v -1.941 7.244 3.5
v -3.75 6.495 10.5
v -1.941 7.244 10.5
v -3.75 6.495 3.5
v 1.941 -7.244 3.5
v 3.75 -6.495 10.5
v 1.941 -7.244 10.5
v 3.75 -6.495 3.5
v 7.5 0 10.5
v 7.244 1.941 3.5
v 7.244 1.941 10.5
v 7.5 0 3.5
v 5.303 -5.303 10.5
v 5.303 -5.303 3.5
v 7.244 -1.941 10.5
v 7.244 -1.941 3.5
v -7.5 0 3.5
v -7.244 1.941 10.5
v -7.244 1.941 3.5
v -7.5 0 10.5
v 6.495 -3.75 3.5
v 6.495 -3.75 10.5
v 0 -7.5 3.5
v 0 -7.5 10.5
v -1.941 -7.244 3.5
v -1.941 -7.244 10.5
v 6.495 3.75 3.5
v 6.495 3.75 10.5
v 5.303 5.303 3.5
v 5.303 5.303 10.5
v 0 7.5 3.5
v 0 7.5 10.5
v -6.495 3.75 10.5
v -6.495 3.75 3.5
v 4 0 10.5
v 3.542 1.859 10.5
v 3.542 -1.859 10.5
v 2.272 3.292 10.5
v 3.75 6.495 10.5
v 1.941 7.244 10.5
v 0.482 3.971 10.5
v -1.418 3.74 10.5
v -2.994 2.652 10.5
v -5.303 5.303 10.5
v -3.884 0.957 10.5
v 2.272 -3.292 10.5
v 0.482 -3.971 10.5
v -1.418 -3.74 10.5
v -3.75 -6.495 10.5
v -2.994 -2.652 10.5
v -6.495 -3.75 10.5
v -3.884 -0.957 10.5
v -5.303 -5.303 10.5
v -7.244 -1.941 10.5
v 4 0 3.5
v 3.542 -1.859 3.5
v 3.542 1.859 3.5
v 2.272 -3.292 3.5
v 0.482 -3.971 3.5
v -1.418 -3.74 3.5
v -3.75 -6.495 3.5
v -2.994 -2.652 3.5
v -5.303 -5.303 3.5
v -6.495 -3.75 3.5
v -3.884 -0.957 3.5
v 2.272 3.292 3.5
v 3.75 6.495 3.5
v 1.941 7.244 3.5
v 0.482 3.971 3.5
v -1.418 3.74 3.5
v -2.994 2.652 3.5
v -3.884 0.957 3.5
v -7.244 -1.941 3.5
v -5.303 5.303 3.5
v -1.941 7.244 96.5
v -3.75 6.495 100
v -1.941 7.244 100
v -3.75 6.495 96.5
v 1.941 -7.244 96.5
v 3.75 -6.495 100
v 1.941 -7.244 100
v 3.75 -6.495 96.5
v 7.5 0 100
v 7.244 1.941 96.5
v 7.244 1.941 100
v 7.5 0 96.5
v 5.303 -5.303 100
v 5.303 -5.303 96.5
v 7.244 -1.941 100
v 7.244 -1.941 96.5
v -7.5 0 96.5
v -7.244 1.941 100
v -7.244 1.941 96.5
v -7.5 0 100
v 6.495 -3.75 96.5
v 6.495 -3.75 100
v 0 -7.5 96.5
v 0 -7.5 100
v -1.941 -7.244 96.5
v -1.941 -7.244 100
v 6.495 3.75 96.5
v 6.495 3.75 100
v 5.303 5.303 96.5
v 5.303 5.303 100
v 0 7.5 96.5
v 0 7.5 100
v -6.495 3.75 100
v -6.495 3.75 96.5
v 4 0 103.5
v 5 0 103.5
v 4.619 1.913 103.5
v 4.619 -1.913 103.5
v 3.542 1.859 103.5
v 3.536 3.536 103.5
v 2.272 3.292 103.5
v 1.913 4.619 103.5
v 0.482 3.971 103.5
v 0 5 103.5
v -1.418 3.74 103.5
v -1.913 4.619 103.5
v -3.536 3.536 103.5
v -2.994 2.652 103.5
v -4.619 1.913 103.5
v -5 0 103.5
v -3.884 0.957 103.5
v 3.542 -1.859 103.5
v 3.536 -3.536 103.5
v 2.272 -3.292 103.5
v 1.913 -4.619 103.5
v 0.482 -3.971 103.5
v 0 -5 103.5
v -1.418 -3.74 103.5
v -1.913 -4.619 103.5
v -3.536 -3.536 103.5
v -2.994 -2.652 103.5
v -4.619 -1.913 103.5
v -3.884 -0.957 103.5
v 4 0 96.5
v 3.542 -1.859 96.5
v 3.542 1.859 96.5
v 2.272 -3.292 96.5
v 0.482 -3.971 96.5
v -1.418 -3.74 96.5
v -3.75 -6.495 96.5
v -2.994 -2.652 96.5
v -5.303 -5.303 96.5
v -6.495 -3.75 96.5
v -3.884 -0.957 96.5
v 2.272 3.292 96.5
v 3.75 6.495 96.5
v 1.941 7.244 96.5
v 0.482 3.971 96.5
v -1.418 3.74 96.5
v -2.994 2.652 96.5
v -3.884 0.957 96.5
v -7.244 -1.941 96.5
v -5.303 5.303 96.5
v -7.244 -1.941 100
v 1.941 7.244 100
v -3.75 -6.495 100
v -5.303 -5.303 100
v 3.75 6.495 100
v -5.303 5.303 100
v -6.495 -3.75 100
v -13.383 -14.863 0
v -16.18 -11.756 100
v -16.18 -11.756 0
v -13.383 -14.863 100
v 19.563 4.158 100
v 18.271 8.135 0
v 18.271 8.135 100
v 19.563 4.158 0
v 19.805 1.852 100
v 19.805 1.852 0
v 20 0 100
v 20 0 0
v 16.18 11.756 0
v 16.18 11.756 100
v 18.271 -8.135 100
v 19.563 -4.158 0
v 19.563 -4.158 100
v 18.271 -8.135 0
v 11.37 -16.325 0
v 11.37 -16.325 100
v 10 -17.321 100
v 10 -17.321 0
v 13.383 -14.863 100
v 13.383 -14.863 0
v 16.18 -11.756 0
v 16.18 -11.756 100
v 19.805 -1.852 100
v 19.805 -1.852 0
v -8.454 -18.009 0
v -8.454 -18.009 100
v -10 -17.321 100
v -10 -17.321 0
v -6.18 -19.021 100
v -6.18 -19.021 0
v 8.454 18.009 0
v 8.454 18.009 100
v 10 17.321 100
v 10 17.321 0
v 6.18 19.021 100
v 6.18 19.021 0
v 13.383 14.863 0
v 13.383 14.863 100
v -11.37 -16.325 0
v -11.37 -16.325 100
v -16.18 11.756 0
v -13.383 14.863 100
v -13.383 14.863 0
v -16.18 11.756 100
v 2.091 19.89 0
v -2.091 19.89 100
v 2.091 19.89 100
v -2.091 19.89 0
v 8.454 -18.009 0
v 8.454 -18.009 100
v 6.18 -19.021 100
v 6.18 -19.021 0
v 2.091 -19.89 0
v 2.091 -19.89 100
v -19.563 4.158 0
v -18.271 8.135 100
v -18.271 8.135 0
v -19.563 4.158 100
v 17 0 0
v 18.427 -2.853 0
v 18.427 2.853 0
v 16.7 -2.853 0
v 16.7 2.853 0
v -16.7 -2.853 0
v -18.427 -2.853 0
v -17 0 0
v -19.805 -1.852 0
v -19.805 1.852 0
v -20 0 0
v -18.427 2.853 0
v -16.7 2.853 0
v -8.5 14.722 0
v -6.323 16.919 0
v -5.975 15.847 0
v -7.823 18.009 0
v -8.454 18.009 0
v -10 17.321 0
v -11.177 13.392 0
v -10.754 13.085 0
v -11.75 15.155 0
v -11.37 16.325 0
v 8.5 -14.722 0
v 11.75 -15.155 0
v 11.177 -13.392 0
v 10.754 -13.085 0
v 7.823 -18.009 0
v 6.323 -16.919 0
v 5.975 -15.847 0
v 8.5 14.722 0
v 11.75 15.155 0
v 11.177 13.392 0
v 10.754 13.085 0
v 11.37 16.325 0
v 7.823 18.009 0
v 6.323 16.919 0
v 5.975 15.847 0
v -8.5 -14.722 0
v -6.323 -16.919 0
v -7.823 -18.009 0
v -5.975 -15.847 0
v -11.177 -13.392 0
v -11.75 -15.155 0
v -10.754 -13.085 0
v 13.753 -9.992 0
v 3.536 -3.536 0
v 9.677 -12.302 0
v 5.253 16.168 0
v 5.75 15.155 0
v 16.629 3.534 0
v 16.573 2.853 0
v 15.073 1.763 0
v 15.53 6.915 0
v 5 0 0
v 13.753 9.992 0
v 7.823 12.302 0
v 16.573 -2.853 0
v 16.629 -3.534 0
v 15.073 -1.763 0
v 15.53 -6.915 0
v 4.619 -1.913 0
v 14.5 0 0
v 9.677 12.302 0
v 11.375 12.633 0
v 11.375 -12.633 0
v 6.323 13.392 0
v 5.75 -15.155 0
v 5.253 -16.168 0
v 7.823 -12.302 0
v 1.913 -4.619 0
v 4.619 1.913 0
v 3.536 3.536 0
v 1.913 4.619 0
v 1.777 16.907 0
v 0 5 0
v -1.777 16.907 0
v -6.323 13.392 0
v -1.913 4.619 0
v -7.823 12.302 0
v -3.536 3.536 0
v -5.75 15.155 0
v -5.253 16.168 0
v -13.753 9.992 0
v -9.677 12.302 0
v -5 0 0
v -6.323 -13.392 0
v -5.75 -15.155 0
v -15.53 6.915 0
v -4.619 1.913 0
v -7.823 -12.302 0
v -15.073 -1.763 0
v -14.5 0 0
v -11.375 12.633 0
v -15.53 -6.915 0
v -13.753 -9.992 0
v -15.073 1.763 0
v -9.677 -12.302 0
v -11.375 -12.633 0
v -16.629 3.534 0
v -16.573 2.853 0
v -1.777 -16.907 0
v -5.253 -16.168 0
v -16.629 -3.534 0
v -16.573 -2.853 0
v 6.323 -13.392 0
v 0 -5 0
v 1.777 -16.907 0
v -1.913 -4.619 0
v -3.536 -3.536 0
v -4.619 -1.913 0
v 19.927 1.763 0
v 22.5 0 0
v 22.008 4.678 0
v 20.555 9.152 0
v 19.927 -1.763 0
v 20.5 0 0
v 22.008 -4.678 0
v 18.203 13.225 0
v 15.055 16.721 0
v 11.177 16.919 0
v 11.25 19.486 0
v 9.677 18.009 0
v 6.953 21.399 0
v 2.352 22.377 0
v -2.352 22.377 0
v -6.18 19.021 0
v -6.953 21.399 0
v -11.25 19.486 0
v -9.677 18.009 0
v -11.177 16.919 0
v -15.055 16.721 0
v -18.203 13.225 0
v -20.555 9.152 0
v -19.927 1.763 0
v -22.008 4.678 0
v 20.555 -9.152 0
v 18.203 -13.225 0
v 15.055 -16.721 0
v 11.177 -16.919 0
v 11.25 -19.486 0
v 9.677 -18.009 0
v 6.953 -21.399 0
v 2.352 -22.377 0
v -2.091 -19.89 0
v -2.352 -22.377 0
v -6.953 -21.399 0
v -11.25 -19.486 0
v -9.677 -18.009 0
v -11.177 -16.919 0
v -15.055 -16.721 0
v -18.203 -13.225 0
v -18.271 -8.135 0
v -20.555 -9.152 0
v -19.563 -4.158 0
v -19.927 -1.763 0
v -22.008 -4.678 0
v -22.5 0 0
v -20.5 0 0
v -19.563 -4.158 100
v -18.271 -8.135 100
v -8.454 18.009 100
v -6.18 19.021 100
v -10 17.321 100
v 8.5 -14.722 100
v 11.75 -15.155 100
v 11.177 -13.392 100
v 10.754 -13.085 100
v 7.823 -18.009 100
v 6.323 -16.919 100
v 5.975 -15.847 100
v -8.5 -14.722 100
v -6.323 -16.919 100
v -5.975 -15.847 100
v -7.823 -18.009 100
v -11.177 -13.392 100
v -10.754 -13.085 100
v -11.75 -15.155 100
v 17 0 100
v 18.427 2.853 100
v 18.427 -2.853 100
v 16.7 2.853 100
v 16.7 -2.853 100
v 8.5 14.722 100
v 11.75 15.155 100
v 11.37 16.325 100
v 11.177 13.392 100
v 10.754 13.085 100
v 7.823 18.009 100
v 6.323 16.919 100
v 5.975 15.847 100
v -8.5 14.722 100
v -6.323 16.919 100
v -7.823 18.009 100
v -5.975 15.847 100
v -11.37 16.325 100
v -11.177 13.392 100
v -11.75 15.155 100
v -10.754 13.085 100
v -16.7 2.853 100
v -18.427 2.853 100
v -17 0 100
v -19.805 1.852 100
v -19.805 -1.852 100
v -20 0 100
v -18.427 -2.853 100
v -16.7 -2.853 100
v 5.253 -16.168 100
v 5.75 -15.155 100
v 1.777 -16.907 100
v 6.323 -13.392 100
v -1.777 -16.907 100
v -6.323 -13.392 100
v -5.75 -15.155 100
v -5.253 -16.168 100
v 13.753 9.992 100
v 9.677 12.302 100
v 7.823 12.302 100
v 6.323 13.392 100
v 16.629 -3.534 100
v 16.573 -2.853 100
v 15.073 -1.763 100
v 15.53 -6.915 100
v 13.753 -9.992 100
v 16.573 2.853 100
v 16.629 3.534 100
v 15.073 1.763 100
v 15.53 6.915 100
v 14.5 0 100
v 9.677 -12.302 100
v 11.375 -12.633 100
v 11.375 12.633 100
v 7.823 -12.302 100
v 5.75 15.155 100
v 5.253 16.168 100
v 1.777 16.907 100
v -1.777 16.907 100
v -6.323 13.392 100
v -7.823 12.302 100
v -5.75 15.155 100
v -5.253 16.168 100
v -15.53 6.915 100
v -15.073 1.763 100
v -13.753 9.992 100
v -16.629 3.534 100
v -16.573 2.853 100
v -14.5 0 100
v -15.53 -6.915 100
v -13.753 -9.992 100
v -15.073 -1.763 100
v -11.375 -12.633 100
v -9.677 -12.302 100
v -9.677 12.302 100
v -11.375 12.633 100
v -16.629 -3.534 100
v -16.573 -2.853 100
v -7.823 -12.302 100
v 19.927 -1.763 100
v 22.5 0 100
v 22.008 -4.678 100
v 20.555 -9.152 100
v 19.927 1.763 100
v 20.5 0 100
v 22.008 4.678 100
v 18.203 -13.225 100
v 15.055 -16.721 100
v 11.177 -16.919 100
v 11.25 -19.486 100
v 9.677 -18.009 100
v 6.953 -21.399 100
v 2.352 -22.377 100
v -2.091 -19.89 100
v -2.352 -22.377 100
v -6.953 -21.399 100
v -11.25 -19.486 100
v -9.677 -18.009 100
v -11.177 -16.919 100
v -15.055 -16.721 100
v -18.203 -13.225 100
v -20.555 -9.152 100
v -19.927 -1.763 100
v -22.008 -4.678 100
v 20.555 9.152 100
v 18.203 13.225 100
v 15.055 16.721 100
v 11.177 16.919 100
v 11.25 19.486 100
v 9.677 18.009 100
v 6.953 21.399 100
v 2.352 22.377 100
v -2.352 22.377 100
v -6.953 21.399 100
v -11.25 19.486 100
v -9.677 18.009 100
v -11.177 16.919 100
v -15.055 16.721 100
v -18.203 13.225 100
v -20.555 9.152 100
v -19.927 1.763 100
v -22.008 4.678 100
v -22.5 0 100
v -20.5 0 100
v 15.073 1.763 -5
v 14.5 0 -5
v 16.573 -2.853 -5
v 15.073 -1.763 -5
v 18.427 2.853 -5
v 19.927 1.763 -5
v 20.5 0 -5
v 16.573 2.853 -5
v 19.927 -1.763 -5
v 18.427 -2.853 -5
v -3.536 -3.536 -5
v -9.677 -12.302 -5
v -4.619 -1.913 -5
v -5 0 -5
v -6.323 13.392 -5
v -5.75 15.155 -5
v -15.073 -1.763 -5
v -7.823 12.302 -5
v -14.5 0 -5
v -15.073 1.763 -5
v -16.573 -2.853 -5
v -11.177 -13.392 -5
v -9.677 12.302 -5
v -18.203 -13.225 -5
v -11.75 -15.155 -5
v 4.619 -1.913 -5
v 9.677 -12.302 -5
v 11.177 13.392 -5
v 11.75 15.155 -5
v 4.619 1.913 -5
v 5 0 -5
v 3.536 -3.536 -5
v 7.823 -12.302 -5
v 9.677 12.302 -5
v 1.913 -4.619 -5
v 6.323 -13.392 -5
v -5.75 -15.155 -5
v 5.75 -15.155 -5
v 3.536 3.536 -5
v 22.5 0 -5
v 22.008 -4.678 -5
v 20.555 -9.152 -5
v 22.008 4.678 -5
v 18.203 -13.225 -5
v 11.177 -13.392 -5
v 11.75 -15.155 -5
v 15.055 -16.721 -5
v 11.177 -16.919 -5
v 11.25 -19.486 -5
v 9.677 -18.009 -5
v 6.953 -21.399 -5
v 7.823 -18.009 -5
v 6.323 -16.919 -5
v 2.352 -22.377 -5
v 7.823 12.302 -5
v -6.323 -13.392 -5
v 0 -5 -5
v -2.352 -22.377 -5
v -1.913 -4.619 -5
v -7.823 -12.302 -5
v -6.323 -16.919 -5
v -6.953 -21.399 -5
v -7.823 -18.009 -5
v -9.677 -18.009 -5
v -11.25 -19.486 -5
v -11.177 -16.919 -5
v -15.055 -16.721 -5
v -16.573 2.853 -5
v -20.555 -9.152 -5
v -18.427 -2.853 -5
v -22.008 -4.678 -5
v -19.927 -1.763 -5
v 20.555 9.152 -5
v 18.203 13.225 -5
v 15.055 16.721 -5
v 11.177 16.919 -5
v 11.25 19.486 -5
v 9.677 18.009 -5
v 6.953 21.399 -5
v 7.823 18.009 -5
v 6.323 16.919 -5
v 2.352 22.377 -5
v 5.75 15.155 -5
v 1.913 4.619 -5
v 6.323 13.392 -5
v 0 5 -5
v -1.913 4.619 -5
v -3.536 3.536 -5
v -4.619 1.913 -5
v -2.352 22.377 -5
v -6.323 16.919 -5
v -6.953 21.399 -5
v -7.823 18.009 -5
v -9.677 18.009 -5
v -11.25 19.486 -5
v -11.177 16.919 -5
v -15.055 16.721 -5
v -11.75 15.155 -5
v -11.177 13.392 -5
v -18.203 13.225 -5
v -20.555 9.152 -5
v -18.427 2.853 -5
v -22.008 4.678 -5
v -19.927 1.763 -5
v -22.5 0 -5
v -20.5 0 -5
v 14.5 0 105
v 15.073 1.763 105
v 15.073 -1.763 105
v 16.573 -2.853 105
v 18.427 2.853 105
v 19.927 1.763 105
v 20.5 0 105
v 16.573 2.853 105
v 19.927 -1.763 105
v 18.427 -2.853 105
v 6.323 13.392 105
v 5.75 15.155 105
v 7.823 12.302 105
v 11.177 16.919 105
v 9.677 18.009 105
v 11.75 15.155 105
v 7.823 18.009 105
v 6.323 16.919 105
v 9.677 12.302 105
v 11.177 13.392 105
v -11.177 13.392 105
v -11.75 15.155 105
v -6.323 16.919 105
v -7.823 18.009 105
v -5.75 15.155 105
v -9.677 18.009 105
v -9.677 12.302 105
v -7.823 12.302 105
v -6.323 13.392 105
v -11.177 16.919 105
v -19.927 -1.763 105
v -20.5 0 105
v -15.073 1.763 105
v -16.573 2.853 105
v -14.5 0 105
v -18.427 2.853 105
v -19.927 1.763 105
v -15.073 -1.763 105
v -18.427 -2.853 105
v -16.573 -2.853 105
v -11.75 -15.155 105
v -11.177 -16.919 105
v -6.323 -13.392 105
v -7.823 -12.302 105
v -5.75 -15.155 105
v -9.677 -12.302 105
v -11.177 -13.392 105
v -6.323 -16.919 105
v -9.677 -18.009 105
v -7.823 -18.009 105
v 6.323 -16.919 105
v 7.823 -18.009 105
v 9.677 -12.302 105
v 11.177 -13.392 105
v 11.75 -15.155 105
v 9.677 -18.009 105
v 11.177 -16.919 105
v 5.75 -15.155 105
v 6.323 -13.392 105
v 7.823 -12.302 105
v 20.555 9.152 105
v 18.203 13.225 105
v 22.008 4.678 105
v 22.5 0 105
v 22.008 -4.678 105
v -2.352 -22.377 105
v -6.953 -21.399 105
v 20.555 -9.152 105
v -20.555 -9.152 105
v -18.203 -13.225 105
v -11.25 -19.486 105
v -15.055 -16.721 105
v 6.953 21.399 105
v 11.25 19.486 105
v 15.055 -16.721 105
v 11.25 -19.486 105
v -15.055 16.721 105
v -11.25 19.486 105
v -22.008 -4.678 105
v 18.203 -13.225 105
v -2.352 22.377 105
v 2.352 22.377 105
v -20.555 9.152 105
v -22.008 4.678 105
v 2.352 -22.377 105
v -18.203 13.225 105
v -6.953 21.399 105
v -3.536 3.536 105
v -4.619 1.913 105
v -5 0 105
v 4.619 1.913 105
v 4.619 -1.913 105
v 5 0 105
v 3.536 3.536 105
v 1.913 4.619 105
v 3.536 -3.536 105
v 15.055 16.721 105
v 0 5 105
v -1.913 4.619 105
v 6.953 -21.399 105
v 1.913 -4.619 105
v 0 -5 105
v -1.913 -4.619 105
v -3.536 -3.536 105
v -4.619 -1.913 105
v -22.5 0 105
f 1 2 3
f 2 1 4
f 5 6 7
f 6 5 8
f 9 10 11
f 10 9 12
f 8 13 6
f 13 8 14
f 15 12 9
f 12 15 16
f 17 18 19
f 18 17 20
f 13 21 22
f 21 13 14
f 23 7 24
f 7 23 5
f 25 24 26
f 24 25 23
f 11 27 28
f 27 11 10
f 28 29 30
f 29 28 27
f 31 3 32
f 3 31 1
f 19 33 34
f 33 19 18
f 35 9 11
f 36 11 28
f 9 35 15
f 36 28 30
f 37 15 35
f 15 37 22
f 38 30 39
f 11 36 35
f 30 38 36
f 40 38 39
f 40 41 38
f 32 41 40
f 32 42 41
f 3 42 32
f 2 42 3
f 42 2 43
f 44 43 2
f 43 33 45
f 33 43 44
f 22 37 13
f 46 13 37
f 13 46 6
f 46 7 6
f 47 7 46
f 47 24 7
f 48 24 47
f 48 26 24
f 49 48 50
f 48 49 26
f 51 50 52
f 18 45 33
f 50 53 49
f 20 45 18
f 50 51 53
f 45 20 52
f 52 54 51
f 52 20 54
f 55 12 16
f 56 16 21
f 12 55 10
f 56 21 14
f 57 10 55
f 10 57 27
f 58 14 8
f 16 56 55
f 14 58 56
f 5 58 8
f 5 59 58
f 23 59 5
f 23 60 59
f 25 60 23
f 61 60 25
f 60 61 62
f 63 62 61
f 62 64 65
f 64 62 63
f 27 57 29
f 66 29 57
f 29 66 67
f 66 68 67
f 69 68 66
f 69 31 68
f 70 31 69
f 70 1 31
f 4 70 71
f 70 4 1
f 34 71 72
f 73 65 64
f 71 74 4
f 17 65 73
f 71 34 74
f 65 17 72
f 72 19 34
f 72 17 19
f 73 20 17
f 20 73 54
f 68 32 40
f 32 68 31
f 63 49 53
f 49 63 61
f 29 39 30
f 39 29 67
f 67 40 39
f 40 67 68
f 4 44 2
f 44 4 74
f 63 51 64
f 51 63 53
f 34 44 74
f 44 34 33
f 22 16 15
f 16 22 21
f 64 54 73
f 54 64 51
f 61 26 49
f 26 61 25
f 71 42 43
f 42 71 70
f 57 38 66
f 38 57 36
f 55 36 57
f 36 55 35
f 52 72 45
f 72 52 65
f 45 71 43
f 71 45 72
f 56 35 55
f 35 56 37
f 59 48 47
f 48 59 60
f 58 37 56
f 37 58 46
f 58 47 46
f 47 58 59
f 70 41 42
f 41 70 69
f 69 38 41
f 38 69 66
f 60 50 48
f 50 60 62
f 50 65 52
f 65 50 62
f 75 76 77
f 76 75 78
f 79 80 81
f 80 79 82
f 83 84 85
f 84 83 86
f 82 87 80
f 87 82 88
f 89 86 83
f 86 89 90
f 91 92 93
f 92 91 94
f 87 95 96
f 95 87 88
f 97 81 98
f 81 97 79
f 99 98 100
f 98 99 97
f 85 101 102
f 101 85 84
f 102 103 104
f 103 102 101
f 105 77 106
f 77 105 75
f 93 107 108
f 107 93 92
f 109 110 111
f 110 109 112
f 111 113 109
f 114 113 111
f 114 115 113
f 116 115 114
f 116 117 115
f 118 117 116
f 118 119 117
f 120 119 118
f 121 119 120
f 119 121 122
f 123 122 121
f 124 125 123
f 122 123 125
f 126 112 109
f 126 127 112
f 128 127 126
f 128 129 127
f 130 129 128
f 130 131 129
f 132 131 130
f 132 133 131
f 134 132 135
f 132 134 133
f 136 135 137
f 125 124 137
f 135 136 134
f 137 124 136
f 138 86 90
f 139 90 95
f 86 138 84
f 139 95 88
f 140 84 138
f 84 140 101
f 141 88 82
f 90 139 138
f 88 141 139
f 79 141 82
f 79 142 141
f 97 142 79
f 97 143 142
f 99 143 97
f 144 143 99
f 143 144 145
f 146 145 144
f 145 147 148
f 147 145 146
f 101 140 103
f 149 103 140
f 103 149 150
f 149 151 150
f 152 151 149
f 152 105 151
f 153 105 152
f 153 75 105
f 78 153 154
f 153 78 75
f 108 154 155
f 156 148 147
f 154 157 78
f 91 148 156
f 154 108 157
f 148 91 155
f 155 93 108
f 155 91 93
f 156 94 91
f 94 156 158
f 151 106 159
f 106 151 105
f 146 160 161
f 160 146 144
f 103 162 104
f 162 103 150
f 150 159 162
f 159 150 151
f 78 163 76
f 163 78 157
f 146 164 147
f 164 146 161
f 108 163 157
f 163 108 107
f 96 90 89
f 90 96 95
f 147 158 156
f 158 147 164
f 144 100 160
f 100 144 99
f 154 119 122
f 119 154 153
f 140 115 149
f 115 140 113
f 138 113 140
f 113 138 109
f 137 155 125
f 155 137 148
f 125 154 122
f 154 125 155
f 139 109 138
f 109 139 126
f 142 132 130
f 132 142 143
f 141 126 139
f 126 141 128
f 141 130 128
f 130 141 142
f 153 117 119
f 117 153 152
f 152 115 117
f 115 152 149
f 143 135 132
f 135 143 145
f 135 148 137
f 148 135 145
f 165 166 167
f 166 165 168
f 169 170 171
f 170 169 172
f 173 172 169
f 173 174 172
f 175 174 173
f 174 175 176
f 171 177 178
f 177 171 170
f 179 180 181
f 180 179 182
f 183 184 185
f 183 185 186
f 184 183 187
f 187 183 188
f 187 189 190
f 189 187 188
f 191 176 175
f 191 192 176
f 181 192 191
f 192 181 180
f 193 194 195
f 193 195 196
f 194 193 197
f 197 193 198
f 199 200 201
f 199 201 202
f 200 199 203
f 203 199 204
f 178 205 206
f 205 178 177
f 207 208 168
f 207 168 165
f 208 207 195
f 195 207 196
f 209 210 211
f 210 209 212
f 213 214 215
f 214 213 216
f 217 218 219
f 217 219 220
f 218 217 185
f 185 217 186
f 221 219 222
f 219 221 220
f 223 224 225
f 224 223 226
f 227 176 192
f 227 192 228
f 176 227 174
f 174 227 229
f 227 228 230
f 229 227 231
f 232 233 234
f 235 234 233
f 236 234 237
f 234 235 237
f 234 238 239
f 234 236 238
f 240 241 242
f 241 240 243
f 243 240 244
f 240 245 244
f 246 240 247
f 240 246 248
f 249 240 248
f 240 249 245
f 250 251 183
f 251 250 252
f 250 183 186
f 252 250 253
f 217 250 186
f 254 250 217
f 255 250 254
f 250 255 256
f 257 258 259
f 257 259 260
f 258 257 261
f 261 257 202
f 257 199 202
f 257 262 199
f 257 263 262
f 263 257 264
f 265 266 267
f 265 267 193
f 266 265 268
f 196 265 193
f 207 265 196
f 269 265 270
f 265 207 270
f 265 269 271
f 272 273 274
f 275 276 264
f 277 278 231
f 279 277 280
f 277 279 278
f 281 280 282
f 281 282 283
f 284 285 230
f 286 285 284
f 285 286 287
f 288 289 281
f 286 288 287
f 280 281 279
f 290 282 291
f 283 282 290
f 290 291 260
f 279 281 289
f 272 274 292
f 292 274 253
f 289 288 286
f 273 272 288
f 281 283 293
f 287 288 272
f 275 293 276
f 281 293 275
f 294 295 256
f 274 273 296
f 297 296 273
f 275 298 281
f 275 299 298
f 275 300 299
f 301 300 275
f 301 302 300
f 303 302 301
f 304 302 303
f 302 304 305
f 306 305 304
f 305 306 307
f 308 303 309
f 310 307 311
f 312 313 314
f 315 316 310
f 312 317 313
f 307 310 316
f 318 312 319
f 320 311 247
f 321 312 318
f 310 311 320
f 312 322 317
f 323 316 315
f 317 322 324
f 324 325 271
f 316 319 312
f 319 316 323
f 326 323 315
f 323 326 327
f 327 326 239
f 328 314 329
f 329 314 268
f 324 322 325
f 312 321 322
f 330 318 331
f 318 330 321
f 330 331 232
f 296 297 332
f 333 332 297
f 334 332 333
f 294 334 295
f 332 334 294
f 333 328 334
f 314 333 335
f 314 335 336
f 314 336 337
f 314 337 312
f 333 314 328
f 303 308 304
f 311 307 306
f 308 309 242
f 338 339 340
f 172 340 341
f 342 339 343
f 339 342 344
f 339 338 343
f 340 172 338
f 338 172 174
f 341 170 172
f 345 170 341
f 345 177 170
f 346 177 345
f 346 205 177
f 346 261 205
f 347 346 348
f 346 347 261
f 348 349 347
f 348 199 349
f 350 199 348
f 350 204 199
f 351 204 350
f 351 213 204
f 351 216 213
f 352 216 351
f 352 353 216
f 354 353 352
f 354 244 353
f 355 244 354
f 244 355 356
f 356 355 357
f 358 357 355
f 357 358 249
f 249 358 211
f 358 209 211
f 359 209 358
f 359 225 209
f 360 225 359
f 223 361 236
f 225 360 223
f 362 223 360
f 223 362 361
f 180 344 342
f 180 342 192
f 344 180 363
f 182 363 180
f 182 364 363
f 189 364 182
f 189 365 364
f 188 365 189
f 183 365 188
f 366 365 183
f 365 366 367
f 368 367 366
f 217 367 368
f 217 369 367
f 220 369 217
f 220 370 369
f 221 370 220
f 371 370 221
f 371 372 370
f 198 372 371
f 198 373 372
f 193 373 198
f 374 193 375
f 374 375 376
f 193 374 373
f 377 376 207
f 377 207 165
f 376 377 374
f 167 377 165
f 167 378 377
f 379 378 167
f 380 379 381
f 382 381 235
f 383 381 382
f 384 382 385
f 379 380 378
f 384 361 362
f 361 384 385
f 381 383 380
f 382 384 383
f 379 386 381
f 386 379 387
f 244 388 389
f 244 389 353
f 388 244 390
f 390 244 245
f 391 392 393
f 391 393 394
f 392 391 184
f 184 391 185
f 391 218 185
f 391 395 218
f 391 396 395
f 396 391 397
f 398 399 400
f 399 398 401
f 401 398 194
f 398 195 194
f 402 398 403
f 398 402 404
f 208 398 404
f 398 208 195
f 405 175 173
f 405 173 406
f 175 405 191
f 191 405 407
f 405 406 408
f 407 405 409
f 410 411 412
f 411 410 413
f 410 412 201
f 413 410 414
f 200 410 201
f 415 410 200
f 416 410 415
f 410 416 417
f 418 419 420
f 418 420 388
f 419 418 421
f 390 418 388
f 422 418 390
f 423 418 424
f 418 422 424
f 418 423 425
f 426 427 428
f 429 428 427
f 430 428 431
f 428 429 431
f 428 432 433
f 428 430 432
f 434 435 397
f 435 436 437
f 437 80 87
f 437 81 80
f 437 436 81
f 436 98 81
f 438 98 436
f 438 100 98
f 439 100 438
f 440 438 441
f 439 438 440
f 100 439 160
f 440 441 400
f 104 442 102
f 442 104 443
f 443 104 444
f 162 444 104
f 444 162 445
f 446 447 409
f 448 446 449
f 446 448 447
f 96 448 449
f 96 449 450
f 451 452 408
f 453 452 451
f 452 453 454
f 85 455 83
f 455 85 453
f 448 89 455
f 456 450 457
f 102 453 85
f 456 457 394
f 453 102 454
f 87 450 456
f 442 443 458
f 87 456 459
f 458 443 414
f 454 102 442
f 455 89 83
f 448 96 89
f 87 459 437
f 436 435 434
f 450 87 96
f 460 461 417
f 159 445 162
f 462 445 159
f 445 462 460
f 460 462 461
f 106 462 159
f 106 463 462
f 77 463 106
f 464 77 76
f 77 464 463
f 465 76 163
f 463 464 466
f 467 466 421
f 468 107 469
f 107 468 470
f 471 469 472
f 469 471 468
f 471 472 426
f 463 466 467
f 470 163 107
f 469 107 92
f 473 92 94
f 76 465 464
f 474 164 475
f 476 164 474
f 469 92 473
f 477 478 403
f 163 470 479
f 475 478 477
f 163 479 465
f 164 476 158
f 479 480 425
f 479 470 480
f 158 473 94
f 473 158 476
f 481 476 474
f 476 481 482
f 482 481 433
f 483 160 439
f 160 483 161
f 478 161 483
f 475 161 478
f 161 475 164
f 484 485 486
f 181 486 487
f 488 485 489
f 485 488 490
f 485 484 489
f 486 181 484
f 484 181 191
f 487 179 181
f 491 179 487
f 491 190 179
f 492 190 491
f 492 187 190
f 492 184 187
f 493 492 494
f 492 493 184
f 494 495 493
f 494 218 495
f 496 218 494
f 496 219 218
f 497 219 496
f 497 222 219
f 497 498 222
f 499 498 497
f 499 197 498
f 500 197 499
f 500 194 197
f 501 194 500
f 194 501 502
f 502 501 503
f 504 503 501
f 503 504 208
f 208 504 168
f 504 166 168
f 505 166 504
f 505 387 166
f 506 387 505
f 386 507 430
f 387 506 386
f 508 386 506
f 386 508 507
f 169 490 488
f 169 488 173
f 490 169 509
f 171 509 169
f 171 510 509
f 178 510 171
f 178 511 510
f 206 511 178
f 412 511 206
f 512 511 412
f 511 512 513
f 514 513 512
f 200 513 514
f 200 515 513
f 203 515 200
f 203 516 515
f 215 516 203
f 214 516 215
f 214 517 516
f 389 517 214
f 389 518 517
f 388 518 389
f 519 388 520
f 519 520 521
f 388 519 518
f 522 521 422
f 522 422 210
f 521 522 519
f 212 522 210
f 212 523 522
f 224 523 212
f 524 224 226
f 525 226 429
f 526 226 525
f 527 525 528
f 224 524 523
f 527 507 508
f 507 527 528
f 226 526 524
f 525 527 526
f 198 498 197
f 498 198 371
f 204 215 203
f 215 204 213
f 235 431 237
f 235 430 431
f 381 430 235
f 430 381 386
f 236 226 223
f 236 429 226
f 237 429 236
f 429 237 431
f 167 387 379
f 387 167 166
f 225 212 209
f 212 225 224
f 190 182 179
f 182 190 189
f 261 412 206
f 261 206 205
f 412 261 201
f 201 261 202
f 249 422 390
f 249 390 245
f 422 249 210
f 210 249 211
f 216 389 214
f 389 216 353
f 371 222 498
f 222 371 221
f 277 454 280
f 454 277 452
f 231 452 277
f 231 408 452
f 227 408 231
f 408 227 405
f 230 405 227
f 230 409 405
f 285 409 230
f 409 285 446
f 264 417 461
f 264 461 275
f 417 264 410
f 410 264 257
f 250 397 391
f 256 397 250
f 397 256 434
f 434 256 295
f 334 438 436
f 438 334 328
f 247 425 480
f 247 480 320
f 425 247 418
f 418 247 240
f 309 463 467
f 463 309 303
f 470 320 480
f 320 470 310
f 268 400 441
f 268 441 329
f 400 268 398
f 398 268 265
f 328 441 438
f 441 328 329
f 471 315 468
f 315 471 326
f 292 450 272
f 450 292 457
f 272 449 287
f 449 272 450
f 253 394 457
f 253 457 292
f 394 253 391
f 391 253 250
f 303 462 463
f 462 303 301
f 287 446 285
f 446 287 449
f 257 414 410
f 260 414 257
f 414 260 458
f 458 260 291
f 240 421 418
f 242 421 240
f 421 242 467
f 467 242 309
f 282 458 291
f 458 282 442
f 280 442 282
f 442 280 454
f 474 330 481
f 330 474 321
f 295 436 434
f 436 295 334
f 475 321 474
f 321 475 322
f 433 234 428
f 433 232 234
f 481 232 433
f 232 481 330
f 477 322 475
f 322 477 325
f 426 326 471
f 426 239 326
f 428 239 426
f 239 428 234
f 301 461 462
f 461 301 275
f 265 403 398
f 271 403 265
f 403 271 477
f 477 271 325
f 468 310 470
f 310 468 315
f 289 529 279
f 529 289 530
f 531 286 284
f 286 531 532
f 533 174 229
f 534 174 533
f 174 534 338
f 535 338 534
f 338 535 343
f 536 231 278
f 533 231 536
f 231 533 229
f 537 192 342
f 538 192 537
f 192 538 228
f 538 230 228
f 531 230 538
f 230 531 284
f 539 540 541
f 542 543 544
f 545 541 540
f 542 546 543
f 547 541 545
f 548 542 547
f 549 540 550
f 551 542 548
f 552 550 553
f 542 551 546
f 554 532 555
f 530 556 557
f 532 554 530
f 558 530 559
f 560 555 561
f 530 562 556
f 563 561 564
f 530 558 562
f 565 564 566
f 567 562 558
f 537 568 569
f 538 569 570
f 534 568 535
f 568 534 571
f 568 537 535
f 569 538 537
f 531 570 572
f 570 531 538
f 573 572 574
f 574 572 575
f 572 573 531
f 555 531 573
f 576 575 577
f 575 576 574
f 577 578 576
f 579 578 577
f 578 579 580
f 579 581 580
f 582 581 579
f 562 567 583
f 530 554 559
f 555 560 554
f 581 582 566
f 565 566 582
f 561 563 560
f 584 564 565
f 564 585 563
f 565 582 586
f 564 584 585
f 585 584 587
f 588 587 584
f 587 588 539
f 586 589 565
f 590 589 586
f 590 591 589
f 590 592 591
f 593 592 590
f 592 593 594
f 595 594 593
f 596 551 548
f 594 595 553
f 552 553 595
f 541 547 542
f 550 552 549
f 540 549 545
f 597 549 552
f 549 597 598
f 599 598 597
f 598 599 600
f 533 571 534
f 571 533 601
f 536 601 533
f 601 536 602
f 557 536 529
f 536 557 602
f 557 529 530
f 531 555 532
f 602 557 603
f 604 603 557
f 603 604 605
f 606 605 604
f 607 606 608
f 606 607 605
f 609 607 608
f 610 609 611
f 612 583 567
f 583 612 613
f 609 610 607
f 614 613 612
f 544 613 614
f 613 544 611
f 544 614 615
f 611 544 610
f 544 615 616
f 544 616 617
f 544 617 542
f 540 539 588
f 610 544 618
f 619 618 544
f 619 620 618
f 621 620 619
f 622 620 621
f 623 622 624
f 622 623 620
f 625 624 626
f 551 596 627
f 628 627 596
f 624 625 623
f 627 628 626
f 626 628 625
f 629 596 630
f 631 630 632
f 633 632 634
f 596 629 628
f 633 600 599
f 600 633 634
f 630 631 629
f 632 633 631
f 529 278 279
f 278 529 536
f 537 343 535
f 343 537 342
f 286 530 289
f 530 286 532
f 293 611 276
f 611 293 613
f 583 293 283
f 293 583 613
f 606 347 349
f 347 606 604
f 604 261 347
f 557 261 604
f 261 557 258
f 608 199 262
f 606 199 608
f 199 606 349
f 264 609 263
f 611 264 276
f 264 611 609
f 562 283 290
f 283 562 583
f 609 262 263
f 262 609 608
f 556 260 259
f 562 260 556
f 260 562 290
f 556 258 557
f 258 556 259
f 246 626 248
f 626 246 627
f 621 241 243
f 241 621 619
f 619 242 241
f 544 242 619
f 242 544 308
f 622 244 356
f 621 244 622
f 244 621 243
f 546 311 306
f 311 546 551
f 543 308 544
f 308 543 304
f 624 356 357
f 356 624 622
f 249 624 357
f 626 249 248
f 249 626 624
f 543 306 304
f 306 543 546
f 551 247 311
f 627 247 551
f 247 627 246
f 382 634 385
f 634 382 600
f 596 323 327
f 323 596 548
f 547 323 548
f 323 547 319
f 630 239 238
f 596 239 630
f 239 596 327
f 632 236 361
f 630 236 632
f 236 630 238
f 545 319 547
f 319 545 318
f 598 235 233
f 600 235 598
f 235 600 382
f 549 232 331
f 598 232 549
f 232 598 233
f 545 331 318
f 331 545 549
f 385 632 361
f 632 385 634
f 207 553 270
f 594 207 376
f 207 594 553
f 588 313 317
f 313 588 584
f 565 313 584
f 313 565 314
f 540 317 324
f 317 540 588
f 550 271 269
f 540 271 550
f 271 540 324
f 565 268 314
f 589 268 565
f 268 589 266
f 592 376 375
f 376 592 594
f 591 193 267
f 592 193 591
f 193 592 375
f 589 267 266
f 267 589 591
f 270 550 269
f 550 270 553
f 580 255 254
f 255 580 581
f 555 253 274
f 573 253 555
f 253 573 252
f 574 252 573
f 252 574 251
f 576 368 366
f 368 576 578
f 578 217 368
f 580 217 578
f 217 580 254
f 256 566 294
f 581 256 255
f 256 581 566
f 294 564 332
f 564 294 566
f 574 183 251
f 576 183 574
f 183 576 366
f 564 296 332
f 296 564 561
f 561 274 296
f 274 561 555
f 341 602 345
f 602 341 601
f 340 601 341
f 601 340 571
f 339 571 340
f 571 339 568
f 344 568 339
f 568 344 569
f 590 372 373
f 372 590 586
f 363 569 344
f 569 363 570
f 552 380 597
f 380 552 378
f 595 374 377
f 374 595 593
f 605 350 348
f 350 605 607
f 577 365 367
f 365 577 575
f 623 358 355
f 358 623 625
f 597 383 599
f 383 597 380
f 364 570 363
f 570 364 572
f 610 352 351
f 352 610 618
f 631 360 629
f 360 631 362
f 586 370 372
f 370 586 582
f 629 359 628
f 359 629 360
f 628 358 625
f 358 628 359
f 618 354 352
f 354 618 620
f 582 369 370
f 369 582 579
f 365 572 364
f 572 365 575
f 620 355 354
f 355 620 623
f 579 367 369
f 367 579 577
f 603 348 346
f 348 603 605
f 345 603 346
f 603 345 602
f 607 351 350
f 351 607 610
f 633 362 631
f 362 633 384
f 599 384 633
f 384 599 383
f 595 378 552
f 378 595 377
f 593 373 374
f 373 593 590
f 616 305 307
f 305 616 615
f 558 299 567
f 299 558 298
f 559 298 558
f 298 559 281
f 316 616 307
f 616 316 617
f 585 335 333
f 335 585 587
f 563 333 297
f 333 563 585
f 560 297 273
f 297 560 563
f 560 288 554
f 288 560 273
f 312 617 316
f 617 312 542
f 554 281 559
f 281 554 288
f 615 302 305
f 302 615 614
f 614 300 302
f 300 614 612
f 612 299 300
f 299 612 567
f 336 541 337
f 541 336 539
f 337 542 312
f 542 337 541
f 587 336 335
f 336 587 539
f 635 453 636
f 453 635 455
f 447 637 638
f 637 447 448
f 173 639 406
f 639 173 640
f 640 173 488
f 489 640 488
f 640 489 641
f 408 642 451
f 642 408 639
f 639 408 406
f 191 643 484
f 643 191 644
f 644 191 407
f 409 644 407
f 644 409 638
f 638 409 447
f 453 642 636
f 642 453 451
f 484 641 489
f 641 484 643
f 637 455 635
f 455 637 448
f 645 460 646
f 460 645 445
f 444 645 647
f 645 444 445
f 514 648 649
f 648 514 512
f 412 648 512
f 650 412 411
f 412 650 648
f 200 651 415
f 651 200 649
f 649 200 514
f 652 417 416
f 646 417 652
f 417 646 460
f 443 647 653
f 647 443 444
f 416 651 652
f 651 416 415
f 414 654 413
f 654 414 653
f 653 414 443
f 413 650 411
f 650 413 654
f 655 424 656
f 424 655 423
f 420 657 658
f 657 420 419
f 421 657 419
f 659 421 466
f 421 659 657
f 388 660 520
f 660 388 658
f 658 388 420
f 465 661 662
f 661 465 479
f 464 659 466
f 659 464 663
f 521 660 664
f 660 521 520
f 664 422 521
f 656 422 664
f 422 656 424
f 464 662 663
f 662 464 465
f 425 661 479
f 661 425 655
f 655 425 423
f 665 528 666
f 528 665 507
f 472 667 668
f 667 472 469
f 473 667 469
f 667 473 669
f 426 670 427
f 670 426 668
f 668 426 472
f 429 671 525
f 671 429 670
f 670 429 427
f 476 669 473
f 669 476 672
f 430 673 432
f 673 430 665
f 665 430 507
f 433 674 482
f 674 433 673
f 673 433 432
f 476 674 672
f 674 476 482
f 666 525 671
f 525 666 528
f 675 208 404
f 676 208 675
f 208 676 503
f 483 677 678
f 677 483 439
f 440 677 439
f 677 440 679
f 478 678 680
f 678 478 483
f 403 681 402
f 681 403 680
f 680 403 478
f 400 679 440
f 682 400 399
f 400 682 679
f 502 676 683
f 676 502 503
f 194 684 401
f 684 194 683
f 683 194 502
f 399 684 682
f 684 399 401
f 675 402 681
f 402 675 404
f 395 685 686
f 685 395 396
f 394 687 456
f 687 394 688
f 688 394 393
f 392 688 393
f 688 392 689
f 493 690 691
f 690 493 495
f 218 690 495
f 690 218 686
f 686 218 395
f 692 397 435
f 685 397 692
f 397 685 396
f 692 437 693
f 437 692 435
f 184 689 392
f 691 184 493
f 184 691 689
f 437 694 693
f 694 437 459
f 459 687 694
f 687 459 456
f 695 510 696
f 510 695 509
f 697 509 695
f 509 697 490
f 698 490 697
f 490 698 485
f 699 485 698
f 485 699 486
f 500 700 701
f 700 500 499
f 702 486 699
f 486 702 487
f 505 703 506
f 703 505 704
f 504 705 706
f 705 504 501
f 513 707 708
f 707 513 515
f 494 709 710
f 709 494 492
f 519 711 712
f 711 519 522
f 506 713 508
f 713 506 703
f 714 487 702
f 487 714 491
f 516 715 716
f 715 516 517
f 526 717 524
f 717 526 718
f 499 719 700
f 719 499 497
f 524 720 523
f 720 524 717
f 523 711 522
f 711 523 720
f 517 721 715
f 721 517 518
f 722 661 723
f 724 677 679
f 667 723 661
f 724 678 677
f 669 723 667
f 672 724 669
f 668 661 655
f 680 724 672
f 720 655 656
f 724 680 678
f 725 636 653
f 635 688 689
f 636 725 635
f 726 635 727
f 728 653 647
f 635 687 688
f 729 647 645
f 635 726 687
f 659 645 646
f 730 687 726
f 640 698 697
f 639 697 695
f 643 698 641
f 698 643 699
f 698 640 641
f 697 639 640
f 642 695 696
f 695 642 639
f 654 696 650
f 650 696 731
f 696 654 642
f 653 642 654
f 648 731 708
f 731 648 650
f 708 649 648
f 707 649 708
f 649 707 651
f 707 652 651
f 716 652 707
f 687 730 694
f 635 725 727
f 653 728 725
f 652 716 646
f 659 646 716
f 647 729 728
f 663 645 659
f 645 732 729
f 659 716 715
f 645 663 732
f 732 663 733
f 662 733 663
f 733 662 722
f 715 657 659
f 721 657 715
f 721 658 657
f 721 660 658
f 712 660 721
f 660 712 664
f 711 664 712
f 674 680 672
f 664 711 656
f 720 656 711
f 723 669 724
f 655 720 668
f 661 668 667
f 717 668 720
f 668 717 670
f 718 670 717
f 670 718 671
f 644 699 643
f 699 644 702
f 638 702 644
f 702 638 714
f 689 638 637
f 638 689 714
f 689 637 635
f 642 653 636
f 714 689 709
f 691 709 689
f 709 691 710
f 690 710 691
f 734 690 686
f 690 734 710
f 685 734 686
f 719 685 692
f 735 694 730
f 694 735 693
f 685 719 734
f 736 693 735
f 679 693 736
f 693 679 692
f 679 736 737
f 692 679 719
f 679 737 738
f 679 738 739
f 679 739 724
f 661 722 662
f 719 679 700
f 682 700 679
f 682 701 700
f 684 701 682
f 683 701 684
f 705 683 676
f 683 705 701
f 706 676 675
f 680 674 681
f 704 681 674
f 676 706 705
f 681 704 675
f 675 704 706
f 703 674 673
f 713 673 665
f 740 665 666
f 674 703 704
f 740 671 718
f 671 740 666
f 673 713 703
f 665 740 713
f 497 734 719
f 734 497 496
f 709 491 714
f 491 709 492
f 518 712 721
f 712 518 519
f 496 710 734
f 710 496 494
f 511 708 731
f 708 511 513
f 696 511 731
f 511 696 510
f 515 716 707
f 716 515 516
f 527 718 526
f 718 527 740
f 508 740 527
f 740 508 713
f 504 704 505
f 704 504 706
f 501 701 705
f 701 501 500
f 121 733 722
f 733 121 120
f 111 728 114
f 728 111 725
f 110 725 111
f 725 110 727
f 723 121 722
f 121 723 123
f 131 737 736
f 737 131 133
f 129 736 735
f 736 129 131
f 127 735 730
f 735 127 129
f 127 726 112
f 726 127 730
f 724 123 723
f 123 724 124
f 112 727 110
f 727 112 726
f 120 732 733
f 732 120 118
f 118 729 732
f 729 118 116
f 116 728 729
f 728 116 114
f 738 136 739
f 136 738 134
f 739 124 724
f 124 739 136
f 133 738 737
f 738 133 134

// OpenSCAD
// Rolo Transportador para Esteira Arduino
// Arquivo OpenSCAD Paramétrico
// Data: 2025-11-10
// Projeto: 3dPot - Esteira Transportadora

// ==================== PARÂMETROS ====================
// Todas as medidas em mm

// Dimensões do rolo principal
roller_diameter = 40.0;          // Diâmetro do rolo
roller_length = 100.0;           // Comprimento do rolo
roller_wall_thickness = 3.0;     // Espessura da parede do rolo

// Eixo central
shaft_diameter = 8.0;            // Diâmetro do eixo
shaft_length = 110.0;            // Comprimento do eixo (maior que o rolo)
shaft_key_width = 2.0;           // Largura da chave plana
shaft_key_depth = 1.0;           // Profundidade da chave

// Rolamentos/buchas
bearing_outer_diameter = 15.0;   // Diâmetro externo do rolamento
bearing_inner_diameter = 8.0;    // Diâmetro interno do rolamento
bearing_length = 7.0;            // Comprimento do rolamento

// Flanges (suporte lateral)
flange_diameter = 45.0;          // Diâmetro da flange
flange_thickness = 5.0;          // Espessura da flange
flange_hole_diameter = 6.0;      // Diâmetro dos furos de montagem

// Parâmetros de funcionamento
load_capacity = 2.0;             // Capacidade de carga (kg)
friction_coefficient = 0.3;      // Coeficiente de atrito

// ==================== MODELAGEM ====================

module main_roller() {
    // Rolo principal oco
    difference() {
        // Corpo sólido do rolo
        cylinder(d = roller_diameter, h = roller_length);
        
        // Cavidade interna
        cylinder(d = roller_diameter - 2*roller_wall_thickness, h = roller_length);
        
        // Eixo central (furo)
        cylinder(d = shaft_diameter, h = roller_length + 10);
    }
}

module shaft() {
    // Eixo principal com chanfro
    difference() {
        // Corpo do eixo
        cylinder(d = shaft_diameter, h = shaft_length);
        
        // Chanfro em uma extremidade
        translate([0, 0, shaft_length/2]) {
            // Chave plana para fixação do motor
            cube([shaft_key_width, shaft_diameter, shaft_length/2]);
        }
        
        // Furo de segurança
        translate([0, 0, -5]) {
            cylinder(d = 2, h = shaft_length + 10);
        }
    }
}

module flange_support() {
    // Flange de suporte lateral
    difference() {
        // Flange sólida
        cylinder(d = flange_diameter, h = flange_thickness);
        
        // Furo central para o eixo
        cylinder(d = shaft_diameter + 2, h = flange_thickness + 2);
        
        // Furos de montagem
        for (angle = [0, 60, 120, 180, 240, 300]) {
            translate([
                cos(angle) * (flange_diameter/2 - 5),
                sin(angle) * (flange_diameter/2 - 5),
                0
            ]) {
                cylinder(d = flange_hole_diameter, h = flange_thickness + 2);
            }
        }
    }
}

module bearing_bushing() {
    // Bucha/rolamento de apoio
    difference() {
        // Bucha externa
        cylinder(d = bearing_outer_diameter, h = bearing_length);
        
        // Cavidade interna
        cylinder(d = bearing_inner_diameter, h = bearing_length + 2);
    }
}

module roller_assembly() {
    // Montagem completa do conjunto
    
    // Rolamento/bucha em cada extremidade
    translate([0, 0, bearing_length/2]) {
        bearing_bushing();
    }
    
    translate([0, 0, roller_length - bearing_length/2]) {
        bearing_bushing();
    }
    
    // Rolo principal
    translate([0, 0, 0]) {
        main_roller();
    }
    
    // Flanges de suporte
    translate([0, 0, -flange_thickness]) {
        flange_support();
    }
    
    translate([0, 0, roller_length]) {
        flange_support();
    }
}

// ==================== DESENHO TÉCNICO ====================

// Vista em corte (dimensional)
// translate([-60, 0, 0]) {
//     %roller_assembly();
// }

// ==================== MONTAGEM FINAL ====================

roller_assembly();

// ==================== INSTRUÇÕES DE IMPRESSÃO ====================

/*
INSTRUÇÕES DE IMPRESSÃO 3D:

1. PARÂMETROS RECOMENDADOS:
   - Material: PETG (maior resistência) ou ABS
   - Temperatura: PETG (230-250°C) / ABS (220-240°C)
   - Altura da camada: 0.2mm
   - Velocidade: 40-50mm/s (mais lenta para melhor aderência)
   - Suporte: NECESSÁRIO para overhangs > 45°

2. ORIENTAÇÃO DE IMPRESSÃO:
   - Eixo do rolo perpendicular à base
   - Fazer em 2 partes se necessário
   - Usar brim para melhor aderência

3. MONTAGEM:
   - Inserir eixo central
   - Montar rolamentos 608ZZ nas extremidades
   - Fixar com porcas M8 nas pontas
   - Verificar rotação livre

4. MOTORIZAÇÃO:
   - Usar motor de passo NEMA17
   - Polia GT2 na extremidade do eixo
   - Correia GT2 para transmissão
   - Controlador Arduino + driver A4988

5. COMPONENTES ADICIONAIS NECESSÁRIOS:
   - 2x Rolamentos 608ZZ
   - 1x Eixo M8 x 110mm
   - 2x Porcas M8
   - 4x Parafusos M6 x 20mm (montagem)
   - 1x Polia GT2 20T
   - 1x Correia GT2

6. ESPECIFICAÇÕES TÉCNICAS:
   - Capacidade: 2kg distribuído
   - Velocidade: 10-50mm/s ajustável
   - Precisão: ±1mm
   - Material: PETG com aditivos UV
   - Vida útil: >10.000 ciclos

7. FUNCIONALIDADES:
   - Transporte suave de objetos
   - Controle de velocidade variável
   - Parada automática por sensores
   - Interface serial para controle
   - Monitoramento de posição

8. APLICACÕES:
   - Alimentação automática de impressoras 3D
   - Transporte de peças em produção
   - Sistema de classificação
   - Linha de montagem automatizada
   - Transporte de amostras laboratoriais
*/
